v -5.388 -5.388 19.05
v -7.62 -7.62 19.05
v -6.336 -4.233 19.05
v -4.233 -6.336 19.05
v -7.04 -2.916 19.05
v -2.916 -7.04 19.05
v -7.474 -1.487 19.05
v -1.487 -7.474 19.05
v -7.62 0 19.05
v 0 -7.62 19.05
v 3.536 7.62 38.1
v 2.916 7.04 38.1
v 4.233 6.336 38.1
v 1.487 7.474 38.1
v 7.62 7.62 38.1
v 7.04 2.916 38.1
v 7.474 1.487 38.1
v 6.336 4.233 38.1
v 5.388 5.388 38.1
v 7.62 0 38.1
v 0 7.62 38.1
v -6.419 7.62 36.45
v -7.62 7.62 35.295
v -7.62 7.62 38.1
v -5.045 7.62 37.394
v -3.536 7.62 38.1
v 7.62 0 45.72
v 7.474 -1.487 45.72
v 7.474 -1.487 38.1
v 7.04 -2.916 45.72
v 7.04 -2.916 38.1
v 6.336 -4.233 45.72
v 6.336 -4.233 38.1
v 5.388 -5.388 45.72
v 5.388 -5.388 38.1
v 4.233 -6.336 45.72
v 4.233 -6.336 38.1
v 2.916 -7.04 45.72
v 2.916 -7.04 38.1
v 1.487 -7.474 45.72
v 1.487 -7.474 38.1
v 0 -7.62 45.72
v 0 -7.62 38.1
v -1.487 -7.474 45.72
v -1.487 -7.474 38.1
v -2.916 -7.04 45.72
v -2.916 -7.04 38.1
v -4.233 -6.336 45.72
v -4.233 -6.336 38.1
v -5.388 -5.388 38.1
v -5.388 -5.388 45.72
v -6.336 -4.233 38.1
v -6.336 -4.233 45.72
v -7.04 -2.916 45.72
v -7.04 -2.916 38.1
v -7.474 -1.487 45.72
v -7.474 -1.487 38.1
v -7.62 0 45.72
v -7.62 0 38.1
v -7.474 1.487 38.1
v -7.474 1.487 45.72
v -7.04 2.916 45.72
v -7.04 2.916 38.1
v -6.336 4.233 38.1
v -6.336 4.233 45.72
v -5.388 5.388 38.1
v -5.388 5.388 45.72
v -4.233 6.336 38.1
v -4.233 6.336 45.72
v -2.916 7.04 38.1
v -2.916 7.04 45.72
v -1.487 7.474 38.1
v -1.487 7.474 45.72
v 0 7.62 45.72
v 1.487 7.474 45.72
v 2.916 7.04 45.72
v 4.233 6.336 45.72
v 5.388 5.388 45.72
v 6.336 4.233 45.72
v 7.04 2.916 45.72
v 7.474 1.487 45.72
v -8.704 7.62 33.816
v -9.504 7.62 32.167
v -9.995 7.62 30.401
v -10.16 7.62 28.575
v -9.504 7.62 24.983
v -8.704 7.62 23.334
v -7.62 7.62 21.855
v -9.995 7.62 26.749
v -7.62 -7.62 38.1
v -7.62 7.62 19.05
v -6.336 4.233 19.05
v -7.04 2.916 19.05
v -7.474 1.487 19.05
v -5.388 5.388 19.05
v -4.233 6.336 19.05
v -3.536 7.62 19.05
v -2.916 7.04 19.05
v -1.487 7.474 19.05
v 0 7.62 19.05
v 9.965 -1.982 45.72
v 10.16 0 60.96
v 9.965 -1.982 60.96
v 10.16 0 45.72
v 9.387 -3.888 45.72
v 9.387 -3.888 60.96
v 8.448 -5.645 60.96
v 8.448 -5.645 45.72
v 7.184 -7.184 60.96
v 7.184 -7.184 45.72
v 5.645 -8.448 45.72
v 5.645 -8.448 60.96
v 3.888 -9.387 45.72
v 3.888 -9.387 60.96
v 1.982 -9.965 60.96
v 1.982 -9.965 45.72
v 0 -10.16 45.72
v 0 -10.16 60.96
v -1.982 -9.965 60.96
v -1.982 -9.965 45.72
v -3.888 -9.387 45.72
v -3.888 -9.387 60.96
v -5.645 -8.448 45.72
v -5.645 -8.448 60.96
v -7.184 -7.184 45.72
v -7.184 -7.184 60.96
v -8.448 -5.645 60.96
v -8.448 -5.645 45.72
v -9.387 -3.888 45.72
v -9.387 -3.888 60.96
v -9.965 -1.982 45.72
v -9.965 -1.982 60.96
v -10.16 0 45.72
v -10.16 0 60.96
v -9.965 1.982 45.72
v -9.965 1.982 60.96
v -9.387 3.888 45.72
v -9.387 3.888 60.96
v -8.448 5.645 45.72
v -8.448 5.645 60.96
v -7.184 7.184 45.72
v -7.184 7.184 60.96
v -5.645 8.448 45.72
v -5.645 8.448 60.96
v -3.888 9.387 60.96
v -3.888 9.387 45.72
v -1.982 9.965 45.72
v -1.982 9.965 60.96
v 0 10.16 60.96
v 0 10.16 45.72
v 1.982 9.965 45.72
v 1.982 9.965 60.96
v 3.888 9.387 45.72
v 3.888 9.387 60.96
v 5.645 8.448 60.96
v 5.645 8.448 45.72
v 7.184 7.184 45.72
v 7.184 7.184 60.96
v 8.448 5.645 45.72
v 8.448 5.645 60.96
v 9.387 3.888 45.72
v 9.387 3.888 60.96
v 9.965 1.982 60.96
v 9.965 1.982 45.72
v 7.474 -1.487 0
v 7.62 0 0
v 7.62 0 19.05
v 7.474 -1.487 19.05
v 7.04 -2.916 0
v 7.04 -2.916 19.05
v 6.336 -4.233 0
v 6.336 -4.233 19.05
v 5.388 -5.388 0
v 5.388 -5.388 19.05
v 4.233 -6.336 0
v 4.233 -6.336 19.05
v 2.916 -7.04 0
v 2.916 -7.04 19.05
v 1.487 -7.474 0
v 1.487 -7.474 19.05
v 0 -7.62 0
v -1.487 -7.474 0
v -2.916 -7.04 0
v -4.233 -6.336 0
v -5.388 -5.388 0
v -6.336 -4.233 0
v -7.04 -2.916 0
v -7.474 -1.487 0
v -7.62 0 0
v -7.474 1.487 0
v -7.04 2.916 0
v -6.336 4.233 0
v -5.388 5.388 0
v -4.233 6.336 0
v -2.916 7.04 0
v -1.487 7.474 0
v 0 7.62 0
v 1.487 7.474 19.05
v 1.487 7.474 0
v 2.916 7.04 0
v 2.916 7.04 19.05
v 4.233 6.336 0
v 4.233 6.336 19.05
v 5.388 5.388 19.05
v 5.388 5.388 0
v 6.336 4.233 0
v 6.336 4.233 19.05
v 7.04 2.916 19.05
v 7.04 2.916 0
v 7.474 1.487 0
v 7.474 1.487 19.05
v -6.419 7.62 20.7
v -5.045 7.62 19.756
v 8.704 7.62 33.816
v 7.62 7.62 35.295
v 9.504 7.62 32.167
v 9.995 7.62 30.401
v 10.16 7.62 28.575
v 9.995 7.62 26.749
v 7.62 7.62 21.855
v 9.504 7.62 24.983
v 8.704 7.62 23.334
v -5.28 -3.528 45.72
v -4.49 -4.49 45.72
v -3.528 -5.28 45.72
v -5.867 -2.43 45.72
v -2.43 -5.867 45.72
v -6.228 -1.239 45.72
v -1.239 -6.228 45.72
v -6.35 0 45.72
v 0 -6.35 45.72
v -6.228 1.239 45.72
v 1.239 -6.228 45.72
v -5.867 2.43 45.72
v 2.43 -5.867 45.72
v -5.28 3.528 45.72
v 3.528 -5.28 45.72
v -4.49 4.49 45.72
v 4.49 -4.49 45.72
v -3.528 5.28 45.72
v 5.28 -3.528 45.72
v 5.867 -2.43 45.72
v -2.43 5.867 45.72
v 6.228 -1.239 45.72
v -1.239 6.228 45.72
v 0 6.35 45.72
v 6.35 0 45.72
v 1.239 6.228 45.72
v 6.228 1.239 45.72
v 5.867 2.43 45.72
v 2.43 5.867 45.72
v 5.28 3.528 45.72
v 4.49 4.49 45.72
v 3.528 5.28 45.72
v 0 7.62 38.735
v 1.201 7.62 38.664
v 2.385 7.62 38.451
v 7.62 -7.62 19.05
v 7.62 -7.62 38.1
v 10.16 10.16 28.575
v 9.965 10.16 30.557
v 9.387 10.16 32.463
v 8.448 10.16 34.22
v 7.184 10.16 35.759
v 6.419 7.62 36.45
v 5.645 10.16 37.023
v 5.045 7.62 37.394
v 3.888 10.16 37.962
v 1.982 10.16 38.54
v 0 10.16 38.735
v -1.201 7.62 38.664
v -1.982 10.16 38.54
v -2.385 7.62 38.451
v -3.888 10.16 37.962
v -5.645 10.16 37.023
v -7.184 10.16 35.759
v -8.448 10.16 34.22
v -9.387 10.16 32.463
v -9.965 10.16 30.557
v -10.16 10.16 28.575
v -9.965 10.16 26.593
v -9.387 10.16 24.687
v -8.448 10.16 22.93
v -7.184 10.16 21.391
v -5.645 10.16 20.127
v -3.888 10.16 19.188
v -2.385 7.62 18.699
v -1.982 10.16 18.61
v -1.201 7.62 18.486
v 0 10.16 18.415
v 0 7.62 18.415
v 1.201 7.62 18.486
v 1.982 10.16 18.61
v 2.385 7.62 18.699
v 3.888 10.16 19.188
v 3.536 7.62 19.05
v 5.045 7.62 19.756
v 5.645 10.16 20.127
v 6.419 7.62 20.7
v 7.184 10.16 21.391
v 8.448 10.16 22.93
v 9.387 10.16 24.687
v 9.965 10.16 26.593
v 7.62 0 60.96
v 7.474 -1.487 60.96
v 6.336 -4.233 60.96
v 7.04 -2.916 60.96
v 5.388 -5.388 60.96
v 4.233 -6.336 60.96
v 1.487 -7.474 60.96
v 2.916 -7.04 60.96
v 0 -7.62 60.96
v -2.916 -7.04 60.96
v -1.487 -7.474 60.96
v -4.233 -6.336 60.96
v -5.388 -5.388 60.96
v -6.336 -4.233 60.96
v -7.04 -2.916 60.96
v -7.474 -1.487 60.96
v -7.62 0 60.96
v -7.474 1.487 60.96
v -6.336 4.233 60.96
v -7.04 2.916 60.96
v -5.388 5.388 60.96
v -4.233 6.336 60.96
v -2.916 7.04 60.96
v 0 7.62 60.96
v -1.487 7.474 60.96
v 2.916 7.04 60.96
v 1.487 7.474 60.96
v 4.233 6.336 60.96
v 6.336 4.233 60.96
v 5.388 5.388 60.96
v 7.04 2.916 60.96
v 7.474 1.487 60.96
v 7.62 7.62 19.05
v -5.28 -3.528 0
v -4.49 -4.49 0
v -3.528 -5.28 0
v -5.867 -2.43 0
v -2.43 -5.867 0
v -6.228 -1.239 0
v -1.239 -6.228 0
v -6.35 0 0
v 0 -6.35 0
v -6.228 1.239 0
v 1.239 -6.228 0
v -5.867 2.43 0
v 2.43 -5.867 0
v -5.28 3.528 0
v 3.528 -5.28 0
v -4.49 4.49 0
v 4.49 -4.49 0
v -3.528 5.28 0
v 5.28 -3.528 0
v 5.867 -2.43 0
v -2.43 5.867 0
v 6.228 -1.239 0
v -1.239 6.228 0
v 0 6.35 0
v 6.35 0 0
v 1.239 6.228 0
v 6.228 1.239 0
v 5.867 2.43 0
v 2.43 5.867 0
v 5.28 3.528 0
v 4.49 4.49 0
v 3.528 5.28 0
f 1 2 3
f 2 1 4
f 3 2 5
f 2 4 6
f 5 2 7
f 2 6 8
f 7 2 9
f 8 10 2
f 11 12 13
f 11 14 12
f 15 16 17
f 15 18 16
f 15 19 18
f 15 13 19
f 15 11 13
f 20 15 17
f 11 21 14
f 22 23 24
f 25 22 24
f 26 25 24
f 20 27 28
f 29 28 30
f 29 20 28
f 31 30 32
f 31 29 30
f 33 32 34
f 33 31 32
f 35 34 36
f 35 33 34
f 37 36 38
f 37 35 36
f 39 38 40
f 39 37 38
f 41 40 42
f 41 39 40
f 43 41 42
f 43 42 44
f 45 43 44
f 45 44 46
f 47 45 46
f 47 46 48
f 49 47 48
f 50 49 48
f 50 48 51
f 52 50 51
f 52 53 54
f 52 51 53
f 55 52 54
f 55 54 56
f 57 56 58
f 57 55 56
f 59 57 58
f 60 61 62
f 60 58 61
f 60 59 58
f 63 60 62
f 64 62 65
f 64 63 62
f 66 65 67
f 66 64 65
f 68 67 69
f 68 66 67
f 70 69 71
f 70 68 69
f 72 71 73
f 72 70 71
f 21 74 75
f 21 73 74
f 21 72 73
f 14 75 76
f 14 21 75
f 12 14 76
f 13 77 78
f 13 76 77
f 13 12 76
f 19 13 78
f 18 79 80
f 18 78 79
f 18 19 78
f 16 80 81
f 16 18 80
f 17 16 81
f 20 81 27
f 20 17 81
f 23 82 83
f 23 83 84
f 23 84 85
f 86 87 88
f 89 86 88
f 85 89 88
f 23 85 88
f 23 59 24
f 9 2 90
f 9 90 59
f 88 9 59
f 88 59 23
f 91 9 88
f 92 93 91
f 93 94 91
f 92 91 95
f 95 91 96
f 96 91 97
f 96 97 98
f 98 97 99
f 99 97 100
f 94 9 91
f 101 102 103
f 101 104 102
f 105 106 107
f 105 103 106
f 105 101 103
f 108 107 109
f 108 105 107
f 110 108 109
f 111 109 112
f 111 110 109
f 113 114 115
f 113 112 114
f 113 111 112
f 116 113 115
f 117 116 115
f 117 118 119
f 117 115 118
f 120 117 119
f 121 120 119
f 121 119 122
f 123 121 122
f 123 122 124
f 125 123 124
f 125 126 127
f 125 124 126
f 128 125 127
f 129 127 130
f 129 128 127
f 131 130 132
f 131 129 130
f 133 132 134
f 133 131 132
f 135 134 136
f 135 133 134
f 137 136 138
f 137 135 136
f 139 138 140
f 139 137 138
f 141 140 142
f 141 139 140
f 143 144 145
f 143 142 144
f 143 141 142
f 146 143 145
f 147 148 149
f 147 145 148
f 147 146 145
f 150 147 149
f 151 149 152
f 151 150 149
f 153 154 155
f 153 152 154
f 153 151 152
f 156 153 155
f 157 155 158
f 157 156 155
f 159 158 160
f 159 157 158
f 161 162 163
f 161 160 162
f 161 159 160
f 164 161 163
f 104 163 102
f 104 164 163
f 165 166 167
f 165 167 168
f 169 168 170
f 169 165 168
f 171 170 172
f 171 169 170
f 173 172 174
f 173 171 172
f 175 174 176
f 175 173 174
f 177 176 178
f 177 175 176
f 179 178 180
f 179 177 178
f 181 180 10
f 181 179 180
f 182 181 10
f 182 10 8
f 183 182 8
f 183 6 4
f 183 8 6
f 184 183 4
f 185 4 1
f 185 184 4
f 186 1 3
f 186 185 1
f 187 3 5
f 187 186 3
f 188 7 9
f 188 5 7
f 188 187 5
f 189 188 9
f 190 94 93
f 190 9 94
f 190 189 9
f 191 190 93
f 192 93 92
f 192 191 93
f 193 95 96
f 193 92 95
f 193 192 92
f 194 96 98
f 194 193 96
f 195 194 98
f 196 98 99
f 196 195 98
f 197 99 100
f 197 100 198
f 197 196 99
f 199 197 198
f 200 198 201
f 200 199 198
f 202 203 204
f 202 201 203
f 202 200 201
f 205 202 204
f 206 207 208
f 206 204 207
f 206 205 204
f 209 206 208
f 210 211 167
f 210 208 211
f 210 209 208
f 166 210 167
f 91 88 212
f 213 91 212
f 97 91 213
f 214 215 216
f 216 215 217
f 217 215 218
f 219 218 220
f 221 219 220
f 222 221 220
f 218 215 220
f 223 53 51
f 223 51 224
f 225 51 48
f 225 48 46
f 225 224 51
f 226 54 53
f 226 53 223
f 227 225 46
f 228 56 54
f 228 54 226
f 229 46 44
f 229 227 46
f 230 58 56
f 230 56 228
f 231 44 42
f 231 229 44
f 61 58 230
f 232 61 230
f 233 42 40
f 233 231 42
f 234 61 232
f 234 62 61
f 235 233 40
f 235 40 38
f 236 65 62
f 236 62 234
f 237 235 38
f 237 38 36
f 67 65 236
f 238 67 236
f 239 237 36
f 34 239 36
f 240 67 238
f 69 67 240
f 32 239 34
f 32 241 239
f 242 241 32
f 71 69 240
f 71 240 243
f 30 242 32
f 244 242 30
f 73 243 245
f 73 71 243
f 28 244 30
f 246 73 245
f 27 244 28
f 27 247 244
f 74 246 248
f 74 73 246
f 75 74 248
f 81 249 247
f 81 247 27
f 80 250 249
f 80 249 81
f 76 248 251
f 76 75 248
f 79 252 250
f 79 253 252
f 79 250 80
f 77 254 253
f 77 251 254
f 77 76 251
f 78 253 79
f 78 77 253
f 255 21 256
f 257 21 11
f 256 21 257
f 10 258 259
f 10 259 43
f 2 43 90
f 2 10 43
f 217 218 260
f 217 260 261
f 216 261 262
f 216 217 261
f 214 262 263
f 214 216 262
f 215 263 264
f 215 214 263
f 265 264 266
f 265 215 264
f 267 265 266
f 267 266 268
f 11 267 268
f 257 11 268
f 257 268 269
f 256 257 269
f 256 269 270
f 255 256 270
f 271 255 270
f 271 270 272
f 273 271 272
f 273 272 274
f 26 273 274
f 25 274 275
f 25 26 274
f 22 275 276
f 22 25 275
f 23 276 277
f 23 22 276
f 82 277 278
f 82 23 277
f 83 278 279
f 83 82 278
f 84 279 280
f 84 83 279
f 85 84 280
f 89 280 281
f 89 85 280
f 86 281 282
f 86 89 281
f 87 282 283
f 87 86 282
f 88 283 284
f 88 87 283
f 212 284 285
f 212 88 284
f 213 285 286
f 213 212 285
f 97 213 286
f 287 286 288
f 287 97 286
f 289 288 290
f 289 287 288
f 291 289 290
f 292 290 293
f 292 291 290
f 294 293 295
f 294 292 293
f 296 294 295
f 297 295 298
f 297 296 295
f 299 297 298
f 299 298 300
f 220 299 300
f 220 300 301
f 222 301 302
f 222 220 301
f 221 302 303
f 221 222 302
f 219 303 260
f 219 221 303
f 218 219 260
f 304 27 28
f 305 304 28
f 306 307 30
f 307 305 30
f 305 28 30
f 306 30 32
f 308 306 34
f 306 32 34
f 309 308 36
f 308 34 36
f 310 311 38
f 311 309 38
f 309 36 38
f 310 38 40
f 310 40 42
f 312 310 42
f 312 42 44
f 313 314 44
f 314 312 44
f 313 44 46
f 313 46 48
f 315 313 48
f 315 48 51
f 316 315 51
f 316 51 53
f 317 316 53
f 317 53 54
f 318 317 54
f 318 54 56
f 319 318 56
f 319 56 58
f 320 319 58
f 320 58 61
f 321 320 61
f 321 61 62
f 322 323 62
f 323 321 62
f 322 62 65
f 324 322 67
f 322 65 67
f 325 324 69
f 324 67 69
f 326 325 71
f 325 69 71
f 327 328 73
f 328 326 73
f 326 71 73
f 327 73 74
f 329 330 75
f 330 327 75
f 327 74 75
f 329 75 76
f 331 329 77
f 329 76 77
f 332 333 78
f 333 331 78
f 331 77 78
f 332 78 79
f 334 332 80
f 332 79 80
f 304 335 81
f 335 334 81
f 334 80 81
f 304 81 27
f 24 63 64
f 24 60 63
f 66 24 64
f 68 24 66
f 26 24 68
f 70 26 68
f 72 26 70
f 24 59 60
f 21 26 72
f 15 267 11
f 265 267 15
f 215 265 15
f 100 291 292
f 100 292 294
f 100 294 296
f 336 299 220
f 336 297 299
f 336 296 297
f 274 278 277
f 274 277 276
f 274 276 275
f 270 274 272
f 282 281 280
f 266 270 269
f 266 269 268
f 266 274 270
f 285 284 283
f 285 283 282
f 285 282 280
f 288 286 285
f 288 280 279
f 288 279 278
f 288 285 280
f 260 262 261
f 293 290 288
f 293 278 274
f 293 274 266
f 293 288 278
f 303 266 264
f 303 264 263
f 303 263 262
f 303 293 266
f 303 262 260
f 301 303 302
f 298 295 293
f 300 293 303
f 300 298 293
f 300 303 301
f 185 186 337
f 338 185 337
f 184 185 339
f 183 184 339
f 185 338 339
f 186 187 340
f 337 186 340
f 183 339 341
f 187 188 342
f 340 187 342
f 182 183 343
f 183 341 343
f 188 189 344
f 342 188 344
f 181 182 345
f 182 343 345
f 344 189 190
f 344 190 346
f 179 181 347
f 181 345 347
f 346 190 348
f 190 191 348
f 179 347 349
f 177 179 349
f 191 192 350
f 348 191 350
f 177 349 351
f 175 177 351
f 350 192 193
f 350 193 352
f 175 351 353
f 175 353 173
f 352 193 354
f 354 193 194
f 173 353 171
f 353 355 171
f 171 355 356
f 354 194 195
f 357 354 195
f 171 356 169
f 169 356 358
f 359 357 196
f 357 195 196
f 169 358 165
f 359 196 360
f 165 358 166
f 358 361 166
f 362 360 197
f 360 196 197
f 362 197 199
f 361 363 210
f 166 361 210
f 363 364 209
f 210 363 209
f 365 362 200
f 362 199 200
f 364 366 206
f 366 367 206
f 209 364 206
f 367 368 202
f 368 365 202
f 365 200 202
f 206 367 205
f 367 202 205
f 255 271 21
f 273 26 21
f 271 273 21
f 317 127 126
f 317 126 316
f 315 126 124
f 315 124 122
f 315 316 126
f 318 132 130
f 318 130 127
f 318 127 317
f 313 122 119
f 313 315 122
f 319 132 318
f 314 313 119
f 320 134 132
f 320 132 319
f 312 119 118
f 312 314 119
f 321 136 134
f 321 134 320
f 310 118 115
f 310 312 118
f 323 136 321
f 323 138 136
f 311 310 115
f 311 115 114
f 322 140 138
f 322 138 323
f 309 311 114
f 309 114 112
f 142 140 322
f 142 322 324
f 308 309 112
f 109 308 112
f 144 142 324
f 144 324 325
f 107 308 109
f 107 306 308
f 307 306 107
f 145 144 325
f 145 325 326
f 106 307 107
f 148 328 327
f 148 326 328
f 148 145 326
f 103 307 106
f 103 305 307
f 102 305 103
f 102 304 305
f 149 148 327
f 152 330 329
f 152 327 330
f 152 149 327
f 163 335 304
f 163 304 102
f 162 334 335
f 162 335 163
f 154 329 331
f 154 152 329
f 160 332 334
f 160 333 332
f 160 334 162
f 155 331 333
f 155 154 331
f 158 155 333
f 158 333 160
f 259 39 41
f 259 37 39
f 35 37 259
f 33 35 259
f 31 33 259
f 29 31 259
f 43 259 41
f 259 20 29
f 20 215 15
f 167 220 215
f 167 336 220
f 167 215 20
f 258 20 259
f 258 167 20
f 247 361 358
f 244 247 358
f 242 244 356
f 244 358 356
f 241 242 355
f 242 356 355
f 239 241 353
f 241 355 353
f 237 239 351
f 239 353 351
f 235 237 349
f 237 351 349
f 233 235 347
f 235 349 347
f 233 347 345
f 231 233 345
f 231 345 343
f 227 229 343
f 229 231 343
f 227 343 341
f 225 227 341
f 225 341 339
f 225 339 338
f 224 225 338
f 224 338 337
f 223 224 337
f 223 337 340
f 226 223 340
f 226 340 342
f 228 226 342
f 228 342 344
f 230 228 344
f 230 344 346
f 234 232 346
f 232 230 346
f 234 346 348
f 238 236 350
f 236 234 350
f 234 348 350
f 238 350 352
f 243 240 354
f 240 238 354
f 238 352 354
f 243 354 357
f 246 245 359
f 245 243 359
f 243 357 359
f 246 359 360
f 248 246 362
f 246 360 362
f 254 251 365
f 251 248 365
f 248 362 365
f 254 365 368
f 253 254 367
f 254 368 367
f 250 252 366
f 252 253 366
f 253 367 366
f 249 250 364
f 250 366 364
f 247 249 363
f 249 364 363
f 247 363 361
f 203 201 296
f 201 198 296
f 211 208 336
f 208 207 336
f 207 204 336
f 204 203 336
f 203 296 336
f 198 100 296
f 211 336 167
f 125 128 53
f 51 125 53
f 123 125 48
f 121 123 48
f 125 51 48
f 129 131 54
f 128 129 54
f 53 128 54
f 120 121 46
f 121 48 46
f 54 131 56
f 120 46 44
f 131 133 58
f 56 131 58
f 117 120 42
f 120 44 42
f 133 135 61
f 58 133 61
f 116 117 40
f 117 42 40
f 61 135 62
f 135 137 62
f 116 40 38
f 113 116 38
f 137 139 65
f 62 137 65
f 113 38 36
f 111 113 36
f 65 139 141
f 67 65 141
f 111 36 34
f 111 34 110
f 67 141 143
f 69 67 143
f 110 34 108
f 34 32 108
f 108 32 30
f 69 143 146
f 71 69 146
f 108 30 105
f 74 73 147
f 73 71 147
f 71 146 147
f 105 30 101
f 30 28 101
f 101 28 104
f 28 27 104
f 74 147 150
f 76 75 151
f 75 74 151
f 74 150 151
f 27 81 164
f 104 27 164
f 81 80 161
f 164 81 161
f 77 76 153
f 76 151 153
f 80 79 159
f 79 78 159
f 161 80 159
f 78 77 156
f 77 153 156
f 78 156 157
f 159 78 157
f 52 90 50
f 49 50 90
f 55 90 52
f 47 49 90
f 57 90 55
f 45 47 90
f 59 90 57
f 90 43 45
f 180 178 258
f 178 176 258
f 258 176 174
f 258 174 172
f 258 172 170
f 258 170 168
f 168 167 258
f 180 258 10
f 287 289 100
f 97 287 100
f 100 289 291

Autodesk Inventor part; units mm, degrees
ref_plane "YZ Plane" through (0, 0, 0) normal (1, 0, 0) x (0, 1, 0)
ref_plane "XZ Plane" through (0, 0, 0) normal (0, 1, 0) x (-1, 0, 0)
ref_plane "XY Plane" through (0, 0, 0) normal (0, 0, 1) x (1, 0, 0)
sketch "Sketch1" plane through (0, 0, 0) normal (0, 0, 1) x (1, 0, 0)
  circle A0 centre (0, 0) radius 6.35
  circle A1 centre (0, 0) radius 7.62
  dimension "d0" = 12.7
  dimension "d1" = 15.24
extrude "Extrusion1" add sketch "Sketch1" along normal blind 19.05
thread "Thread1" size "5/8-11 UNC" class "2A" standard "ANSI Unified Screw Threads" length 12.7
sketch "Sketch3" plane through (0, 0, 19.05) normal (0, 0, 1) x (1, 0, 0)
  circle A0 centre (0, 0) radius 6.35 projected
  line L0 (-7.62, 7.62) -> (7.62, 7.62)
  line L1 (7.62, 7.62) -> (7.62, -7.62)
  line L2 (7.62, -7.62) -> (-7.62, -7.62)
  line L3 (-7.62, -7.62) -> (-7.62, 7.62)
extrude "Extrusion2" add sketch "Sketch3" along normal blind 19.05
sketch "Sketch4" plane through (0, 0, 38.1) normal (0, 0, 1) x (1, 0, 0)
  circle A0 centre (0, 0) radius 6.35 projected
  circle A1 centre (0, 0) radius 6.35
  circle A2 centre (0, 0) radius 7.62
extrude "Extrusion3" add sketch "Sketch4" along normal blind 7.62
sketch "Sketch5" plane through (0, 0, 45.72) normal (0, 0, 1) x (1, 0, 0)
  circle A0 centre (0, 0) radius 7.62 projected
  circle A1 centre (0, 0) radius 7.62
  circle A2 centre (0, 0) radius 10.16
  dimension "d10" = 20.32
extrude "Extrusion4" add sketch "Sketch5" along normal blind 15.24
sketch "Sketch6" plane through (0, 7.62, 19.05) normal (0, 1, 0) x (1, 0, 0)
  circle A0 centre (0, -9.525) radius 10.16
  point P0 (0, 19.05)
  dimension "d13" = 20.32
extrude "Extrusion5" add sketch "Sketch6" along normal blind 2.54
thread "Thread2" size "5/8-11 UNC" class "2B" standard "ANSI Unified Screw Threads" length 25.4
properties part number "half inch flow valve"
